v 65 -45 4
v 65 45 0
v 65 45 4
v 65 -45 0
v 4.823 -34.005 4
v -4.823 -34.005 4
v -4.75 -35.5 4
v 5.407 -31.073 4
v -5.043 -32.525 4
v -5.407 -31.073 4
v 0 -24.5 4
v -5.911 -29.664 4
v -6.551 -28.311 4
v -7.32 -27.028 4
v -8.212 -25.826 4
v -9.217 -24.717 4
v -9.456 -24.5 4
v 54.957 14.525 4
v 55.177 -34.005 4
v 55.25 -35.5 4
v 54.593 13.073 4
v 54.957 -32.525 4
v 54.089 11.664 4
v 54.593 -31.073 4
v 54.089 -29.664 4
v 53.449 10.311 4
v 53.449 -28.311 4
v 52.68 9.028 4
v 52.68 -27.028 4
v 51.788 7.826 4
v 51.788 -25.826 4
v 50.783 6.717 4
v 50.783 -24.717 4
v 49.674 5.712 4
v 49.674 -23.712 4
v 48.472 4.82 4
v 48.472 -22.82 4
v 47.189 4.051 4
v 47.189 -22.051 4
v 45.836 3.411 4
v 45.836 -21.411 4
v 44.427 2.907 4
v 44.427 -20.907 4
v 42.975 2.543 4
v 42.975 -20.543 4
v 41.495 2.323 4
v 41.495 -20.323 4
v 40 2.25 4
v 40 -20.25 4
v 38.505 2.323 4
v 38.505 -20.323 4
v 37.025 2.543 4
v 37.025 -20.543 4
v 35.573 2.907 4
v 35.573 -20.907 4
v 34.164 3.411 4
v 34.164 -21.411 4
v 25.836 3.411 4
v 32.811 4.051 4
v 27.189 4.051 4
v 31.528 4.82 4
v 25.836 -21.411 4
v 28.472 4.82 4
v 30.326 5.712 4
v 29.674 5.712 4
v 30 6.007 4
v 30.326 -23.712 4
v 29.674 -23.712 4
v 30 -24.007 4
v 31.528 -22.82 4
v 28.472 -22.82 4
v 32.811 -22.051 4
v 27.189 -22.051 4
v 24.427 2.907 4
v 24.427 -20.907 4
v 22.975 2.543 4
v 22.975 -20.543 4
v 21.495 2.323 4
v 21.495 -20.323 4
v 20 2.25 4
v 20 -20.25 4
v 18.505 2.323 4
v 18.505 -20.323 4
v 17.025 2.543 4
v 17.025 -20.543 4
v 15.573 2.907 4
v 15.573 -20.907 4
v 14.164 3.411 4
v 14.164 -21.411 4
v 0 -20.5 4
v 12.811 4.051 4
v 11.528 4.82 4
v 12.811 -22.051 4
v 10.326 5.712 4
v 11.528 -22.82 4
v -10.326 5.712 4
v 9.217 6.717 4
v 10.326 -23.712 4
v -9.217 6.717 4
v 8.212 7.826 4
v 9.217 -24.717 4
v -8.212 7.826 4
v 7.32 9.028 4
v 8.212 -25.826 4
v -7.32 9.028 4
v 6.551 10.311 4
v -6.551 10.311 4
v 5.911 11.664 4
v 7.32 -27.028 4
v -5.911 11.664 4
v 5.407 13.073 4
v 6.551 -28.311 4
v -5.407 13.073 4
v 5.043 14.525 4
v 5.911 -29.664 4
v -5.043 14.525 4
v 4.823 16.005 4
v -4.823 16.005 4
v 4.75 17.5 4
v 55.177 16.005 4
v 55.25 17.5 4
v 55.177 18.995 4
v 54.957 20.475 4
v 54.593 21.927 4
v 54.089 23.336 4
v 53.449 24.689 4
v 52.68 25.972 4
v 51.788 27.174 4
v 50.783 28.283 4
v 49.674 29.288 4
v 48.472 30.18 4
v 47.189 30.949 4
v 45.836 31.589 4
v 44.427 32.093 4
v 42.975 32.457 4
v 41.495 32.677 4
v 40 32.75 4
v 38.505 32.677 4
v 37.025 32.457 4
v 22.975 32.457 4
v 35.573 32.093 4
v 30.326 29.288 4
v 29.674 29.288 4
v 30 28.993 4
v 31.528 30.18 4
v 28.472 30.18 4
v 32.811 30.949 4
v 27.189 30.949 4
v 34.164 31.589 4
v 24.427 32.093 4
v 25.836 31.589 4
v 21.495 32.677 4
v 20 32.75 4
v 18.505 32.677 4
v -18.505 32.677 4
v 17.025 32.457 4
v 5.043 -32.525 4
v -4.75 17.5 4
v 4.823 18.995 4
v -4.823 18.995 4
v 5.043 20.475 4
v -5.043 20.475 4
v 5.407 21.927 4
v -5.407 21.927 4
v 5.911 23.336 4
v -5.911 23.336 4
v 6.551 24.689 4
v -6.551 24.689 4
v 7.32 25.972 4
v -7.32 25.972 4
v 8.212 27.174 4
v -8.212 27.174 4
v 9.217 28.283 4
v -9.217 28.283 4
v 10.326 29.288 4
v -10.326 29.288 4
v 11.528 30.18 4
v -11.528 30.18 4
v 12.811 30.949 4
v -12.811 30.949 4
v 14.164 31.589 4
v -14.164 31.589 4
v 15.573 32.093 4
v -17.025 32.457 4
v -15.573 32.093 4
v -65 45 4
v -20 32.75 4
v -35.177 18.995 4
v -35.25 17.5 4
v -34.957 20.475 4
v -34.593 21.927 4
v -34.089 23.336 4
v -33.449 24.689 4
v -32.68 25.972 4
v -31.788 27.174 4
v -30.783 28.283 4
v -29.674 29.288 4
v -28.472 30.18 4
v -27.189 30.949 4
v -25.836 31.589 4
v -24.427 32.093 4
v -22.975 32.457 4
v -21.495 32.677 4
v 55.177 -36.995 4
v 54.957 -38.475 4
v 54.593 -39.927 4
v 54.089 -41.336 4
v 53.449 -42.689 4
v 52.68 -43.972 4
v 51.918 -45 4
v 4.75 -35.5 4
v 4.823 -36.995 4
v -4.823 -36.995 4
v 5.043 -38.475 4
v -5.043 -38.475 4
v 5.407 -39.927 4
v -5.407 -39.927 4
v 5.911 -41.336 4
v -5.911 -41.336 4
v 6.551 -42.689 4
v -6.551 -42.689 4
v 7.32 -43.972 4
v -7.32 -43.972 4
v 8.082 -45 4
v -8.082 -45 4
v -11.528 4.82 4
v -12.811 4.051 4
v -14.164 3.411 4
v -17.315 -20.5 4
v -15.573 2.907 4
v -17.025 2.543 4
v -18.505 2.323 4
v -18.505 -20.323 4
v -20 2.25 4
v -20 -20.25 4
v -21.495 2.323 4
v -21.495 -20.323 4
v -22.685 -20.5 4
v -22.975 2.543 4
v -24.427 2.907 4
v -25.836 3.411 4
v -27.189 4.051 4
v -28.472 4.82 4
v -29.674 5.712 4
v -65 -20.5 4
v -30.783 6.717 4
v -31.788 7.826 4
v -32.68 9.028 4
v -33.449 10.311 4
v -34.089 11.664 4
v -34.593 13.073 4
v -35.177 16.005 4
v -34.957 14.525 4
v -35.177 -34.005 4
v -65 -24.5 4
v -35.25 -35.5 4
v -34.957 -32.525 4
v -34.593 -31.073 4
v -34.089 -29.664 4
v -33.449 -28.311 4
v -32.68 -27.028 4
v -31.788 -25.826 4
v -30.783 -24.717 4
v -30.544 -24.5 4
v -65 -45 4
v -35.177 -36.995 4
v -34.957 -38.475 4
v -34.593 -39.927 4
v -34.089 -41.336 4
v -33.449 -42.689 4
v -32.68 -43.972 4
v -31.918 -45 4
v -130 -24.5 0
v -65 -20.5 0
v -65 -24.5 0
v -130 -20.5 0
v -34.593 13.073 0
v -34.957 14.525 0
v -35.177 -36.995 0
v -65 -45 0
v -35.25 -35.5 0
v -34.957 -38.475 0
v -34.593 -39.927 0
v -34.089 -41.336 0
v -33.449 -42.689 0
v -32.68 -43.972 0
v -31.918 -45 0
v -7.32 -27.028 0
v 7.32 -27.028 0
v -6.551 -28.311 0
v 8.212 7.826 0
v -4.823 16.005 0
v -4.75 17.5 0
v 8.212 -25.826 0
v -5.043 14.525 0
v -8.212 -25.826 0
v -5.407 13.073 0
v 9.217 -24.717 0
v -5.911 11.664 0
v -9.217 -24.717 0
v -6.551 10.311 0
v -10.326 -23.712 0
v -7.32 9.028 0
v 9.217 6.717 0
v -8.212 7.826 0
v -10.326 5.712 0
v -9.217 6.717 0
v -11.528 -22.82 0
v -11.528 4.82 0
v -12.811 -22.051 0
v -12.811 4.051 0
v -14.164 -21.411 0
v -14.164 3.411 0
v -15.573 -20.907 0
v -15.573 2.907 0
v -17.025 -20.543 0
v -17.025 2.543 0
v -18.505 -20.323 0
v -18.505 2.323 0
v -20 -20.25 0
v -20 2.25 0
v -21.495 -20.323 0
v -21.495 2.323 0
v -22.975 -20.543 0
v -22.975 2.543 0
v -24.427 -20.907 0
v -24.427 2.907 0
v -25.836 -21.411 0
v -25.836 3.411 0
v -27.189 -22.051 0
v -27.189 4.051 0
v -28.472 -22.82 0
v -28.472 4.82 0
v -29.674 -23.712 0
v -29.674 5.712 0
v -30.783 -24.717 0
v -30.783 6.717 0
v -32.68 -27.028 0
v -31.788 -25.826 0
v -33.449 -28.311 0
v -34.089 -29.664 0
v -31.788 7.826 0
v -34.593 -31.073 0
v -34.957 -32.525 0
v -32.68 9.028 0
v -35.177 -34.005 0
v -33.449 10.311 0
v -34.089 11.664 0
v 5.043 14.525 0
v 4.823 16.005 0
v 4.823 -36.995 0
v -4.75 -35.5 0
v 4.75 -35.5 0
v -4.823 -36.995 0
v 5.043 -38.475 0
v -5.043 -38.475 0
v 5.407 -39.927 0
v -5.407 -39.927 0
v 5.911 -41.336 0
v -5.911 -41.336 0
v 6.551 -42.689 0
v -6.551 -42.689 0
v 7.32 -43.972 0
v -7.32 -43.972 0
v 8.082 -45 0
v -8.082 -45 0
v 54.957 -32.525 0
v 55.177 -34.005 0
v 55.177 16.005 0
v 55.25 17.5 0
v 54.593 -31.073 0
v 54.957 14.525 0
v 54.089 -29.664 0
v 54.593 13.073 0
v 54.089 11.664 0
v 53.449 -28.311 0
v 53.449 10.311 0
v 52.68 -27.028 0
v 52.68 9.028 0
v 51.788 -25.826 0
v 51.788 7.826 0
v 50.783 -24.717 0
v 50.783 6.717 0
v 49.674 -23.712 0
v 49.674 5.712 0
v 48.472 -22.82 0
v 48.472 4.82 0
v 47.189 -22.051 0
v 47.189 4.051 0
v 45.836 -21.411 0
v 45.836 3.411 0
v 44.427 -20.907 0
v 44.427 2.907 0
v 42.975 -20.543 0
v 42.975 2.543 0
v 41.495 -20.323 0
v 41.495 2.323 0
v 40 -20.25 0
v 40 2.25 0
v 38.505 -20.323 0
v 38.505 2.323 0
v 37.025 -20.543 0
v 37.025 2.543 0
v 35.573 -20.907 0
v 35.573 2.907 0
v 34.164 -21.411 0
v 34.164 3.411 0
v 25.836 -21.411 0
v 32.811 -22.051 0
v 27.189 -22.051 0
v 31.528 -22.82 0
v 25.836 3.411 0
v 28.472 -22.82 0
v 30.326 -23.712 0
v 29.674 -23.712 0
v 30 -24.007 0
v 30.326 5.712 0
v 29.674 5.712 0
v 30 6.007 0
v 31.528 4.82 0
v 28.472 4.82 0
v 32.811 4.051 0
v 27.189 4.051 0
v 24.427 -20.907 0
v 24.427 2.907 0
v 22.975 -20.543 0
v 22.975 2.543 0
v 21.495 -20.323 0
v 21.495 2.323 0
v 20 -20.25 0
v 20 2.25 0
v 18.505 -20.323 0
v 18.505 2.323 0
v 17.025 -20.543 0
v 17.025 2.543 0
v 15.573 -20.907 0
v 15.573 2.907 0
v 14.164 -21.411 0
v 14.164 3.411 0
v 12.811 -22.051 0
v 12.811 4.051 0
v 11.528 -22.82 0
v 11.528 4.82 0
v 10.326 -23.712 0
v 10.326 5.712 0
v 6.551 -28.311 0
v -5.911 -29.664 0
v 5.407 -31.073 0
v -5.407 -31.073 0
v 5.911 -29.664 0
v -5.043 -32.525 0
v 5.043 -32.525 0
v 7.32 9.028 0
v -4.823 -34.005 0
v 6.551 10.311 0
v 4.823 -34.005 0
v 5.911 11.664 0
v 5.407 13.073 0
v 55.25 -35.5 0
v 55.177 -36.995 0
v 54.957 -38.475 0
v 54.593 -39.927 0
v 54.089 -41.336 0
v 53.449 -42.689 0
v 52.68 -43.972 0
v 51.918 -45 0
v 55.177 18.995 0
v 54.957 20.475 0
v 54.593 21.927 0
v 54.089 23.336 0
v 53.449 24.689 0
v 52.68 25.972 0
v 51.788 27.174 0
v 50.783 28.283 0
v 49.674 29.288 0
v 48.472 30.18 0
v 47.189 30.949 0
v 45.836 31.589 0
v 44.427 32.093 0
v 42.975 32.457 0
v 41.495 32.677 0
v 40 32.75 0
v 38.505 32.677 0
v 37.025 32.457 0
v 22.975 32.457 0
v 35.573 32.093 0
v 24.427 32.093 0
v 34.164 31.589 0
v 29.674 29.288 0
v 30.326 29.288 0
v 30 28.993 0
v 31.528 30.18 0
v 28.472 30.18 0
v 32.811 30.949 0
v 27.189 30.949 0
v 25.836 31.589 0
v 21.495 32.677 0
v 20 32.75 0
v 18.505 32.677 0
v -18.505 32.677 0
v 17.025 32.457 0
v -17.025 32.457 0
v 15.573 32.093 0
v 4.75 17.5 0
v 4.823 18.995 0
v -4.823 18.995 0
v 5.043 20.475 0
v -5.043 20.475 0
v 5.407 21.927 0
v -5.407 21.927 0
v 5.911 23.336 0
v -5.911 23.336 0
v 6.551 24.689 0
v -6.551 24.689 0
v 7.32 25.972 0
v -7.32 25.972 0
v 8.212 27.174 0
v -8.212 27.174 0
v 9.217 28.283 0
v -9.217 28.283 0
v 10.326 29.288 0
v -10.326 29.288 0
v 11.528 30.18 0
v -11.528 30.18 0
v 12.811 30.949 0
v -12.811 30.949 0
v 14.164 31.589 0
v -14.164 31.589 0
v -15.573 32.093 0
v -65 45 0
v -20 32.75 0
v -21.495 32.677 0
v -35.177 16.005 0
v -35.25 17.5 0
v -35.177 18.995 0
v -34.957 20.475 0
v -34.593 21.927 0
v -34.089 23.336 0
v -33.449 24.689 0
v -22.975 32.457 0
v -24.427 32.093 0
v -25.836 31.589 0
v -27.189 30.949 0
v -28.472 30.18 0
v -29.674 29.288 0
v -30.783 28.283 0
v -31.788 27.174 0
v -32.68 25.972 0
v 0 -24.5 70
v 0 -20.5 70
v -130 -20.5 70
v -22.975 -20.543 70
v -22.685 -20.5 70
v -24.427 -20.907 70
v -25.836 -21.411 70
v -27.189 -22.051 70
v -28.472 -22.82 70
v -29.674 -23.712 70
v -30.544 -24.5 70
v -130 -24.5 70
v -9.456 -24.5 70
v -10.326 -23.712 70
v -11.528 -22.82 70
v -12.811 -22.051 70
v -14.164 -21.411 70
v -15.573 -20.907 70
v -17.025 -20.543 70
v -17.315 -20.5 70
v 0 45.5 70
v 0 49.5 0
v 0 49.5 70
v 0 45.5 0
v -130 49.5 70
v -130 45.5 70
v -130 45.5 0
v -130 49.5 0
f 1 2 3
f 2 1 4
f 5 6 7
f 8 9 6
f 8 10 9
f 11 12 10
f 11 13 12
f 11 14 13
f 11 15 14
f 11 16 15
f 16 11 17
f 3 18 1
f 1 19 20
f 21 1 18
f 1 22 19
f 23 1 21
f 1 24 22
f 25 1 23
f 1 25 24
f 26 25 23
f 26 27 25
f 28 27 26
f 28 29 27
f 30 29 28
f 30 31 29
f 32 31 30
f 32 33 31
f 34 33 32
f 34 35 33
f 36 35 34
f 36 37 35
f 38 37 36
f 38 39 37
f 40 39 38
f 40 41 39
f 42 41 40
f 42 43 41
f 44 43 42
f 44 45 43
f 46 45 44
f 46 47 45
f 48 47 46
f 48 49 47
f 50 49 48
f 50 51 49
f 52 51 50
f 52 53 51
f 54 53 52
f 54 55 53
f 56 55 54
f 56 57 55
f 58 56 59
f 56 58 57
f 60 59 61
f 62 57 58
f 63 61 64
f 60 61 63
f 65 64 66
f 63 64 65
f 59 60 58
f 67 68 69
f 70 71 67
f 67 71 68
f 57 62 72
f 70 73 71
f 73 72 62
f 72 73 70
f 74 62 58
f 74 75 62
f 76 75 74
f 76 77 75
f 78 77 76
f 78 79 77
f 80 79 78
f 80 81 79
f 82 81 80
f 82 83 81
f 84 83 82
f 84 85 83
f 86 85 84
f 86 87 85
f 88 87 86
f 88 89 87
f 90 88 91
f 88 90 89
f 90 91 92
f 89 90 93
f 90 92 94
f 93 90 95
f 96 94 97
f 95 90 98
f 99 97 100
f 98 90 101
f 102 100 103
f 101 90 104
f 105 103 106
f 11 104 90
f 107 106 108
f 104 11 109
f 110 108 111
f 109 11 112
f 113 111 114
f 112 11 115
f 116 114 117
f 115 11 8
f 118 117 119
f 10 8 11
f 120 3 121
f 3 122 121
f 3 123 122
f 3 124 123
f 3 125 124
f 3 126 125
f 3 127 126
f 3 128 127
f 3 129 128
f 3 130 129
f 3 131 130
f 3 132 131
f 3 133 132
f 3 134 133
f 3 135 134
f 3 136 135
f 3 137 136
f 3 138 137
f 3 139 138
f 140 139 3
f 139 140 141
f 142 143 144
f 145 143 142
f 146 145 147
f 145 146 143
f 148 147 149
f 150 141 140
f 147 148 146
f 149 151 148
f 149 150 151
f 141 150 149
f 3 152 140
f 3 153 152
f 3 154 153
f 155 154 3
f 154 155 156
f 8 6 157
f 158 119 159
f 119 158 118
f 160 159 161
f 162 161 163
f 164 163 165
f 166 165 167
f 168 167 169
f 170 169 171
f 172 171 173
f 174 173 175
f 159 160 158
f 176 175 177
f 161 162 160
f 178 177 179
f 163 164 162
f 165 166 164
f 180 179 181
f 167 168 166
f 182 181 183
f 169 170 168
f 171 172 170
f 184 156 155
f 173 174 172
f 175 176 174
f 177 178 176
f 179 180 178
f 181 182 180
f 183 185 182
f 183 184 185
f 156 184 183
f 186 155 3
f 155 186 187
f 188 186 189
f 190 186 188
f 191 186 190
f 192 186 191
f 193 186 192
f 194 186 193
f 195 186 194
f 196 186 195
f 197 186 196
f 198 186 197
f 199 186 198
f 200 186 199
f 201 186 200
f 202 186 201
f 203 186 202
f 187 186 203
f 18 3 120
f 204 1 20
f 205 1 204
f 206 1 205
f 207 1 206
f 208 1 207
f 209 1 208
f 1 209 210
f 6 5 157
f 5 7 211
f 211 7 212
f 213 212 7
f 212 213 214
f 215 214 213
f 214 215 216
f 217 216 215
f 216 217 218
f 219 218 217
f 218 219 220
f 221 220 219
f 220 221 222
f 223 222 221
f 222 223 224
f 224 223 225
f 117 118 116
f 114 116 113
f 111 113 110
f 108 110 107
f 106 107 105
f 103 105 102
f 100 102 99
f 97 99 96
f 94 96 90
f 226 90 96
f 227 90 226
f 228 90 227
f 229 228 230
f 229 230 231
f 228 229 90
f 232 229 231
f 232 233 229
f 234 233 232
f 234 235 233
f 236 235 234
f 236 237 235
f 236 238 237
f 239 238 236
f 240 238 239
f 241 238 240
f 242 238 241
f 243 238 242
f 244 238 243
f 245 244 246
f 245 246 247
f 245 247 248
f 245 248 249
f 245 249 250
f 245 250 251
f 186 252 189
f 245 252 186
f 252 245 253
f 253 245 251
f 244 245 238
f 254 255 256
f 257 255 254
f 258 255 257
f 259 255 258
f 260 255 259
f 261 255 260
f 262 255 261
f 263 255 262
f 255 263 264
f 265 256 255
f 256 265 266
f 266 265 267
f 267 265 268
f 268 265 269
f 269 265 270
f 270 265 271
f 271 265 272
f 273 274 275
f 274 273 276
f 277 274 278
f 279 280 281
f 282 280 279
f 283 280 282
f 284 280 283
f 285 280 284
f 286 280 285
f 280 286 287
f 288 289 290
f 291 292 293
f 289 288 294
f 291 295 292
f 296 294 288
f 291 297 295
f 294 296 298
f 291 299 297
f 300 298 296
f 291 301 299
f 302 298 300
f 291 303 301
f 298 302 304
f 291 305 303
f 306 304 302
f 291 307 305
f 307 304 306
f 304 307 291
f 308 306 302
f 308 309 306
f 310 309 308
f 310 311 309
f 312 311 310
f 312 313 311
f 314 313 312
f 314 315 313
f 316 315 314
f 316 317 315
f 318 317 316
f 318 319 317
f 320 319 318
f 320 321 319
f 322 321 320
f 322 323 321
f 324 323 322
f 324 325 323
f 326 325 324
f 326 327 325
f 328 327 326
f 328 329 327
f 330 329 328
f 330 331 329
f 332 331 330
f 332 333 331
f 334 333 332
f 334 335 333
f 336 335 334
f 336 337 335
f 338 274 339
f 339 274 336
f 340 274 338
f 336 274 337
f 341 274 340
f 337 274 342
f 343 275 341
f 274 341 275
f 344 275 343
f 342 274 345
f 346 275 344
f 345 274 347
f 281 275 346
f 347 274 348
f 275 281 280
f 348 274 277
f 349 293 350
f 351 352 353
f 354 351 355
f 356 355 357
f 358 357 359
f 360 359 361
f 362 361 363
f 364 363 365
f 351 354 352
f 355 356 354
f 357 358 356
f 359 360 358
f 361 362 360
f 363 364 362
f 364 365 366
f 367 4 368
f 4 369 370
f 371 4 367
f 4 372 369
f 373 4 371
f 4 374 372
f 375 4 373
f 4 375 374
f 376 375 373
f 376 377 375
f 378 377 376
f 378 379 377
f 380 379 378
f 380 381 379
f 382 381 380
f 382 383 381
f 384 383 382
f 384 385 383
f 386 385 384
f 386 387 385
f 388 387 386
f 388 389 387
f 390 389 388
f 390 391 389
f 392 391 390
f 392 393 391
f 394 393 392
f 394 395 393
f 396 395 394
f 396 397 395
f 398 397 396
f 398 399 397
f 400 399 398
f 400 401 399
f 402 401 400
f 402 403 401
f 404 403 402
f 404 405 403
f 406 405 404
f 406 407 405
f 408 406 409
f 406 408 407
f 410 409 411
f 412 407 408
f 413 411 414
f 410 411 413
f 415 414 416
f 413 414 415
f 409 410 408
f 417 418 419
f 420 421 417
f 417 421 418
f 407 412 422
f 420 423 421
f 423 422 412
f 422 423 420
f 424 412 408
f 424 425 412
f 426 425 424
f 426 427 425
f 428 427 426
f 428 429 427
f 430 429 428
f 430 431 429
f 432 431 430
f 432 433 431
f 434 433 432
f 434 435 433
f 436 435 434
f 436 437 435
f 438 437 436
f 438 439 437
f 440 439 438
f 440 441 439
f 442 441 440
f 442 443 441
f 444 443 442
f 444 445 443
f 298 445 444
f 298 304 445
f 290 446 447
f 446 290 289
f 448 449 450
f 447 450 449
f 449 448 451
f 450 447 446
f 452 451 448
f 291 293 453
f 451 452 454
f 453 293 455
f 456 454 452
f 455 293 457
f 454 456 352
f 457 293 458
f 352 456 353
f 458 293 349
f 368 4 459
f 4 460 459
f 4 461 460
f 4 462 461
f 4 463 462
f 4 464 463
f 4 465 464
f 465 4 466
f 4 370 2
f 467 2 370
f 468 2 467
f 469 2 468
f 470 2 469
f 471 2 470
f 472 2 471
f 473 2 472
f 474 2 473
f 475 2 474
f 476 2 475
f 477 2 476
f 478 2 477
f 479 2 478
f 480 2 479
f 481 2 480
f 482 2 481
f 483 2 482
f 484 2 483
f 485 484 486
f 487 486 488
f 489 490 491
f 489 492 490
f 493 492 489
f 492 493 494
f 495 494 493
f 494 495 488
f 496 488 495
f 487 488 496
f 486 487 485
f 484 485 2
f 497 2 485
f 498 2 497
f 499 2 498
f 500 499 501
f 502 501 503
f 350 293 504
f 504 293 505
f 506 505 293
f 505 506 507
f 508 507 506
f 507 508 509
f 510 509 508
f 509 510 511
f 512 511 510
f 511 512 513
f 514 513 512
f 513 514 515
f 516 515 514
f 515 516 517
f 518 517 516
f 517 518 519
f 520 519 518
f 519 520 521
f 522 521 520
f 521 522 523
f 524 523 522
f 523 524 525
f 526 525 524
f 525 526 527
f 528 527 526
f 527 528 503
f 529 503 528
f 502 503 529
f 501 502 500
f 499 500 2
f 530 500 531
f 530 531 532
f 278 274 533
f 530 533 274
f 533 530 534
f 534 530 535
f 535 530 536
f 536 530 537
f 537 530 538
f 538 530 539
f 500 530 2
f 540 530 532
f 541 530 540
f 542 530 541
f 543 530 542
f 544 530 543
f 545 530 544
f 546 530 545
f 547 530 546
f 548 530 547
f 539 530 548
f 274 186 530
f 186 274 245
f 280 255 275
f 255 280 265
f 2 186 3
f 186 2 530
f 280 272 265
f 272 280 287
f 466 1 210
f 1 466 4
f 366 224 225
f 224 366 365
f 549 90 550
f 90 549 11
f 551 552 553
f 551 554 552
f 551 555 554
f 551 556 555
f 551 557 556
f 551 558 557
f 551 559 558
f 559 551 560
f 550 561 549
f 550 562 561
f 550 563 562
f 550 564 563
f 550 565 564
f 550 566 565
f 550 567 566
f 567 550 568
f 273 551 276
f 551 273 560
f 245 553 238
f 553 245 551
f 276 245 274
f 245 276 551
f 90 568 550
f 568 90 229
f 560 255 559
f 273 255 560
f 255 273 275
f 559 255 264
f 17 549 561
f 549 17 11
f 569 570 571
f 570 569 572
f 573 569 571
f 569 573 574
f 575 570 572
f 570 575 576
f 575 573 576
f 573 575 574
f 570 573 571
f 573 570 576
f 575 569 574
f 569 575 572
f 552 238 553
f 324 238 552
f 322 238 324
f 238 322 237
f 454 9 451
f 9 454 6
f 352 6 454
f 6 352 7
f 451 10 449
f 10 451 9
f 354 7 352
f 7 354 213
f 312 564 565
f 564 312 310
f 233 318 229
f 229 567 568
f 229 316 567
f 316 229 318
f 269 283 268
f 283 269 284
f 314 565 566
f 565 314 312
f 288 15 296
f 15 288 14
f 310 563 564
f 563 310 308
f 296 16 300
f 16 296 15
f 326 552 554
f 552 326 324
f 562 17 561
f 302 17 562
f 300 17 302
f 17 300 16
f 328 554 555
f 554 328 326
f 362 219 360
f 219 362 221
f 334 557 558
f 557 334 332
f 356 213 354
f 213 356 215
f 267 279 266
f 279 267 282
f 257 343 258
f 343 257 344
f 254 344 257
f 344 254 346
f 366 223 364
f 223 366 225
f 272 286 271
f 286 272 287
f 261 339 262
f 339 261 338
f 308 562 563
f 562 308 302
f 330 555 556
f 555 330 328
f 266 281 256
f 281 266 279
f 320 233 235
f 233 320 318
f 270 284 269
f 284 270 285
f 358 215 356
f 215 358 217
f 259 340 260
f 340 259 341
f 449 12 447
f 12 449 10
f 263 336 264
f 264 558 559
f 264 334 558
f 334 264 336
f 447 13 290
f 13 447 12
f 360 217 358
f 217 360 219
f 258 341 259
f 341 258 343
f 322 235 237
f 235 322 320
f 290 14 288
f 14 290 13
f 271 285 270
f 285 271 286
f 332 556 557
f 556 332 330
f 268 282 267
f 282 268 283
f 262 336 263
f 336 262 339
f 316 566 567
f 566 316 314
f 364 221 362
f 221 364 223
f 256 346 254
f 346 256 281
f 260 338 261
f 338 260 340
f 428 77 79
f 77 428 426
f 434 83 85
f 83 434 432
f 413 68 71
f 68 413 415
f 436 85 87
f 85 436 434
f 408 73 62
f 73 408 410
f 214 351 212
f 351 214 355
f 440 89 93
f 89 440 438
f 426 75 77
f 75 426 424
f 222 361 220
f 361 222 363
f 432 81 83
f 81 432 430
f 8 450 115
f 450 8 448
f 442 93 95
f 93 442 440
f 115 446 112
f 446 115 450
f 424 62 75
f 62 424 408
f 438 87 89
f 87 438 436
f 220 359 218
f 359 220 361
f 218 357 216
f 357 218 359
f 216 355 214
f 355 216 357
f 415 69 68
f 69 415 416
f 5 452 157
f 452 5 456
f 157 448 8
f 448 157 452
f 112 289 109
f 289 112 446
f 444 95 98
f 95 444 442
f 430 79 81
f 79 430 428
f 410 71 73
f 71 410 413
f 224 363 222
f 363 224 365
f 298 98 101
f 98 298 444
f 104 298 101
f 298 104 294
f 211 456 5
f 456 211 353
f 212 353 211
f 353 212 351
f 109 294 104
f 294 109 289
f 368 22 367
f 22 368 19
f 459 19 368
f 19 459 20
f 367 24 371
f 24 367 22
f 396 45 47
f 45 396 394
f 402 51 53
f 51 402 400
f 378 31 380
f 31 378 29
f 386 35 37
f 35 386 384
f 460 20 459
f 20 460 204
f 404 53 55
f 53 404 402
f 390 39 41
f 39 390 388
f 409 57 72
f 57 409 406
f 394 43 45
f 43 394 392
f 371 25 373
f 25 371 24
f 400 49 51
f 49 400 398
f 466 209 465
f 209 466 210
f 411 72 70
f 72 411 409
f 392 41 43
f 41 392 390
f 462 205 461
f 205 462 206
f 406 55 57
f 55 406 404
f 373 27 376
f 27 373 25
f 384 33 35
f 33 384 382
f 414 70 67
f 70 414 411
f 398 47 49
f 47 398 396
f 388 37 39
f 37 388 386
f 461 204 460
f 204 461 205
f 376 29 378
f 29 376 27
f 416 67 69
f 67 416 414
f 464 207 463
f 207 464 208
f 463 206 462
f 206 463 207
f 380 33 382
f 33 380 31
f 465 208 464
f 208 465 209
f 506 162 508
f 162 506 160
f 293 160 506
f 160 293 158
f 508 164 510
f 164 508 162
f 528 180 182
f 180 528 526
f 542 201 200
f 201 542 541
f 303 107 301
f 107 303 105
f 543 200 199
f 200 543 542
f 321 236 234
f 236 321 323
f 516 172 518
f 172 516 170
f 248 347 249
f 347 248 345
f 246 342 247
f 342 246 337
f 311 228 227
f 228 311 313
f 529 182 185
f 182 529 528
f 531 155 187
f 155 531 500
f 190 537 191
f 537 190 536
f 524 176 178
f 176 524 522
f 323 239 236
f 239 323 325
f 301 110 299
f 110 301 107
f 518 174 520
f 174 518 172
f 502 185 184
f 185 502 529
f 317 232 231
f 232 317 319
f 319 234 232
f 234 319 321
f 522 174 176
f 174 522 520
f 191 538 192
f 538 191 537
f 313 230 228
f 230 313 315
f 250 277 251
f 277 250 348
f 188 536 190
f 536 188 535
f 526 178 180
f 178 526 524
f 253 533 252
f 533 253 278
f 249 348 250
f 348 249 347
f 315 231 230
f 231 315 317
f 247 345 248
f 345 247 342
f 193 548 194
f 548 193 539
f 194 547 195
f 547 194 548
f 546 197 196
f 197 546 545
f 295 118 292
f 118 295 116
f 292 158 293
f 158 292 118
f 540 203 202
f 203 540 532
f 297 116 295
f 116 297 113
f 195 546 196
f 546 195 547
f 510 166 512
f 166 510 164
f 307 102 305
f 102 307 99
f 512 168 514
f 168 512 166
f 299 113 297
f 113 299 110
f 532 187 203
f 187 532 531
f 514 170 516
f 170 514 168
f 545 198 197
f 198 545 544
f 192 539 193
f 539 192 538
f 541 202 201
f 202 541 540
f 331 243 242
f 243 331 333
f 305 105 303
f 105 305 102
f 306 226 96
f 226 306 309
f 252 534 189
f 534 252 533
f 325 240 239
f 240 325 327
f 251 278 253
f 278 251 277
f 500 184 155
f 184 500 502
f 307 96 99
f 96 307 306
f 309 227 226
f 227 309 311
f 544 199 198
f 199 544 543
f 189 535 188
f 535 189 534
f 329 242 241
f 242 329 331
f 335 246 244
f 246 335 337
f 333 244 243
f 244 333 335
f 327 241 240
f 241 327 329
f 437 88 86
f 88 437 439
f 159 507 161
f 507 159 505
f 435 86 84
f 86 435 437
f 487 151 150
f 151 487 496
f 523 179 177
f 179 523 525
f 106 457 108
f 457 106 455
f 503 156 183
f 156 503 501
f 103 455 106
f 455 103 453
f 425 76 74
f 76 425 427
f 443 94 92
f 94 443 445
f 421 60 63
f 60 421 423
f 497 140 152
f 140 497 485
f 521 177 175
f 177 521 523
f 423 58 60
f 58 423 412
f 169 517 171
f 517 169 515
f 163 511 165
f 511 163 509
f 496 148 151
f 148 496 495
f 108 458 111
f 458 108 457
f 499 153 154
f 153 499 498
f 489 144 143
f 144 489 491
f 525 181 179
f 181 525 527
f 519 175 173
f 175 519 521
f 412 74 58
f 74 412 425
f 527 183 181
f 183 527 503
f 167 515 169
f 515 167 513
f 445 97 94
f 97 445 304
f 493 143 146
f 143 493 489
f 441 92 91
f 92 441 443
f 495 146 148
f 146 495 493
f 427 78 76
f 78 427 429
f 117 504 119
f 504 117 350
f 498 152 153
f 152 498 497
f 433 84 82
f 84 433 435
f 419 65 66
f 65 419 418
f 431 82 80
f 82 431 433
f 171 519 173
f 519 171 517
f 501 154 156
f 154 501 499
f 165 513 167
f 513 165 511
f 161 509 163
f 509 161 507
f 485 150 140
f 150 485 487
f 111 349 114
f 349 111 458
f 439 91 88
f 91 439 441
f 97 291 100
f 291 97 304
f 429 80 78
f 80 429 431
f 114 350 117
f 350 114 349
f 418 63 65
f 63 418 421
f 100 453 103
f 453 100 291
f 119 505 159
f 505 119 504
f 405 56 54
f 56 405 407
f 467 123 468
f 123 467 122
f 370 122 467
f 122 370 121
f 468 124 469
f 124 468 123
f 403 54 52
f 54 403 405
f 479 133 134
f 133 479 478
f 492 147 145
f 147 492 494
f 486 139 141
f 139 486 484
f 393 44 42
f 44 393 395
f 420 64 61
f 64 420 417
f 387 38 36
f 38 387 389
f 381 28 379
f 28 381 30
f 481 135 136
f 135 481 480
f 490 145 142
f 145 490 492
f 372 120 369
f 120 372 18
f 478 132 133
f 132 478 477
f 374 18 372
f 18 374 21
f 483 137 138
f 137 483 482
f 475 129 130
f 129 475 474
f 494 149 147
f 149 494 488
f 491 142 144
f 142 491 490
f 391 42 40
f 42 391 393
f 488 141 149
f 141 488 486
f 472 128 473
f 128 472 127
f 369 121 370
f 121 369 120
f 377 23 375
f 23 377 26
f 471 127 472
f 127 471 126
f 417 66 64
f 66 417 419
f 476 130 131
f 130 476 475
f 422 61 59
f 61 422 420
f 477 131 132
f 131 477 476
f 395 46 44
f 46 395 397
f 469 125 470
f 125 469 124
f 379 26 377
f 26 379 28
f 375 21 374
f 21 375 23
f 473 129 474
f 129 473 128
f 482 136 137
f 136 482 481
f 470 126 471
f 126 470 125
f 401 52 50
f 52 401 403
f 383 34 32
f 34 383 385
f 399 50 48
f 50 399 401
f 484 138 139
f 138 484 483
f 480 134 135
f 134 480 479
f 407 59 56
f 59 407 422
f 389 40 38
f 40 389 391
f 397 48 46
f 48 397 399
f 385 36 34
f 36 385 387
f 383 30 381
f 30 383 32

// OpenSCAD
// Built by bench/smallmodels/features/compiler.py from a list of features.
$fn = 64;
difference() {
  union() {
    translate([0, 0, 0]) translate([-65, -45, 0]) cube([130, 90, 4]);
    translate([-65, -22.5, 0]) translate([-65, -2, 0]) cube([130, 4, 70]);
    translate([-65, 47.5, 0]) translate([-65, -2, 0]) cube([130, 4, 70]);
  }
  union() {
    translate([-20, -35.5, -1]) rotate([0, 0, 0]) cylinder(d = 30.5, h = 72);
    translate([20, -35.5, -1]) rotate([0, 0, 0]) cylinder(d = 30.5, h = 72);
    translate([40, -35.5, -1]) rotate([0, 0, 0]) cylinder(d = 30.5, h = 72);
    translate([-20, 17.5, -1]) rotate([0, 0, 0]) cylinder(d = 30.5, h = 72);
    translate([20, 17.5, -1]) rotate([0, 0, 0]) cylinder(d = 30.5, h = 72);
    translate([40, 17.5, -1]) rotate([0, 0, 0]) cylinder(d = 30.5, h = 72);
  }
}
